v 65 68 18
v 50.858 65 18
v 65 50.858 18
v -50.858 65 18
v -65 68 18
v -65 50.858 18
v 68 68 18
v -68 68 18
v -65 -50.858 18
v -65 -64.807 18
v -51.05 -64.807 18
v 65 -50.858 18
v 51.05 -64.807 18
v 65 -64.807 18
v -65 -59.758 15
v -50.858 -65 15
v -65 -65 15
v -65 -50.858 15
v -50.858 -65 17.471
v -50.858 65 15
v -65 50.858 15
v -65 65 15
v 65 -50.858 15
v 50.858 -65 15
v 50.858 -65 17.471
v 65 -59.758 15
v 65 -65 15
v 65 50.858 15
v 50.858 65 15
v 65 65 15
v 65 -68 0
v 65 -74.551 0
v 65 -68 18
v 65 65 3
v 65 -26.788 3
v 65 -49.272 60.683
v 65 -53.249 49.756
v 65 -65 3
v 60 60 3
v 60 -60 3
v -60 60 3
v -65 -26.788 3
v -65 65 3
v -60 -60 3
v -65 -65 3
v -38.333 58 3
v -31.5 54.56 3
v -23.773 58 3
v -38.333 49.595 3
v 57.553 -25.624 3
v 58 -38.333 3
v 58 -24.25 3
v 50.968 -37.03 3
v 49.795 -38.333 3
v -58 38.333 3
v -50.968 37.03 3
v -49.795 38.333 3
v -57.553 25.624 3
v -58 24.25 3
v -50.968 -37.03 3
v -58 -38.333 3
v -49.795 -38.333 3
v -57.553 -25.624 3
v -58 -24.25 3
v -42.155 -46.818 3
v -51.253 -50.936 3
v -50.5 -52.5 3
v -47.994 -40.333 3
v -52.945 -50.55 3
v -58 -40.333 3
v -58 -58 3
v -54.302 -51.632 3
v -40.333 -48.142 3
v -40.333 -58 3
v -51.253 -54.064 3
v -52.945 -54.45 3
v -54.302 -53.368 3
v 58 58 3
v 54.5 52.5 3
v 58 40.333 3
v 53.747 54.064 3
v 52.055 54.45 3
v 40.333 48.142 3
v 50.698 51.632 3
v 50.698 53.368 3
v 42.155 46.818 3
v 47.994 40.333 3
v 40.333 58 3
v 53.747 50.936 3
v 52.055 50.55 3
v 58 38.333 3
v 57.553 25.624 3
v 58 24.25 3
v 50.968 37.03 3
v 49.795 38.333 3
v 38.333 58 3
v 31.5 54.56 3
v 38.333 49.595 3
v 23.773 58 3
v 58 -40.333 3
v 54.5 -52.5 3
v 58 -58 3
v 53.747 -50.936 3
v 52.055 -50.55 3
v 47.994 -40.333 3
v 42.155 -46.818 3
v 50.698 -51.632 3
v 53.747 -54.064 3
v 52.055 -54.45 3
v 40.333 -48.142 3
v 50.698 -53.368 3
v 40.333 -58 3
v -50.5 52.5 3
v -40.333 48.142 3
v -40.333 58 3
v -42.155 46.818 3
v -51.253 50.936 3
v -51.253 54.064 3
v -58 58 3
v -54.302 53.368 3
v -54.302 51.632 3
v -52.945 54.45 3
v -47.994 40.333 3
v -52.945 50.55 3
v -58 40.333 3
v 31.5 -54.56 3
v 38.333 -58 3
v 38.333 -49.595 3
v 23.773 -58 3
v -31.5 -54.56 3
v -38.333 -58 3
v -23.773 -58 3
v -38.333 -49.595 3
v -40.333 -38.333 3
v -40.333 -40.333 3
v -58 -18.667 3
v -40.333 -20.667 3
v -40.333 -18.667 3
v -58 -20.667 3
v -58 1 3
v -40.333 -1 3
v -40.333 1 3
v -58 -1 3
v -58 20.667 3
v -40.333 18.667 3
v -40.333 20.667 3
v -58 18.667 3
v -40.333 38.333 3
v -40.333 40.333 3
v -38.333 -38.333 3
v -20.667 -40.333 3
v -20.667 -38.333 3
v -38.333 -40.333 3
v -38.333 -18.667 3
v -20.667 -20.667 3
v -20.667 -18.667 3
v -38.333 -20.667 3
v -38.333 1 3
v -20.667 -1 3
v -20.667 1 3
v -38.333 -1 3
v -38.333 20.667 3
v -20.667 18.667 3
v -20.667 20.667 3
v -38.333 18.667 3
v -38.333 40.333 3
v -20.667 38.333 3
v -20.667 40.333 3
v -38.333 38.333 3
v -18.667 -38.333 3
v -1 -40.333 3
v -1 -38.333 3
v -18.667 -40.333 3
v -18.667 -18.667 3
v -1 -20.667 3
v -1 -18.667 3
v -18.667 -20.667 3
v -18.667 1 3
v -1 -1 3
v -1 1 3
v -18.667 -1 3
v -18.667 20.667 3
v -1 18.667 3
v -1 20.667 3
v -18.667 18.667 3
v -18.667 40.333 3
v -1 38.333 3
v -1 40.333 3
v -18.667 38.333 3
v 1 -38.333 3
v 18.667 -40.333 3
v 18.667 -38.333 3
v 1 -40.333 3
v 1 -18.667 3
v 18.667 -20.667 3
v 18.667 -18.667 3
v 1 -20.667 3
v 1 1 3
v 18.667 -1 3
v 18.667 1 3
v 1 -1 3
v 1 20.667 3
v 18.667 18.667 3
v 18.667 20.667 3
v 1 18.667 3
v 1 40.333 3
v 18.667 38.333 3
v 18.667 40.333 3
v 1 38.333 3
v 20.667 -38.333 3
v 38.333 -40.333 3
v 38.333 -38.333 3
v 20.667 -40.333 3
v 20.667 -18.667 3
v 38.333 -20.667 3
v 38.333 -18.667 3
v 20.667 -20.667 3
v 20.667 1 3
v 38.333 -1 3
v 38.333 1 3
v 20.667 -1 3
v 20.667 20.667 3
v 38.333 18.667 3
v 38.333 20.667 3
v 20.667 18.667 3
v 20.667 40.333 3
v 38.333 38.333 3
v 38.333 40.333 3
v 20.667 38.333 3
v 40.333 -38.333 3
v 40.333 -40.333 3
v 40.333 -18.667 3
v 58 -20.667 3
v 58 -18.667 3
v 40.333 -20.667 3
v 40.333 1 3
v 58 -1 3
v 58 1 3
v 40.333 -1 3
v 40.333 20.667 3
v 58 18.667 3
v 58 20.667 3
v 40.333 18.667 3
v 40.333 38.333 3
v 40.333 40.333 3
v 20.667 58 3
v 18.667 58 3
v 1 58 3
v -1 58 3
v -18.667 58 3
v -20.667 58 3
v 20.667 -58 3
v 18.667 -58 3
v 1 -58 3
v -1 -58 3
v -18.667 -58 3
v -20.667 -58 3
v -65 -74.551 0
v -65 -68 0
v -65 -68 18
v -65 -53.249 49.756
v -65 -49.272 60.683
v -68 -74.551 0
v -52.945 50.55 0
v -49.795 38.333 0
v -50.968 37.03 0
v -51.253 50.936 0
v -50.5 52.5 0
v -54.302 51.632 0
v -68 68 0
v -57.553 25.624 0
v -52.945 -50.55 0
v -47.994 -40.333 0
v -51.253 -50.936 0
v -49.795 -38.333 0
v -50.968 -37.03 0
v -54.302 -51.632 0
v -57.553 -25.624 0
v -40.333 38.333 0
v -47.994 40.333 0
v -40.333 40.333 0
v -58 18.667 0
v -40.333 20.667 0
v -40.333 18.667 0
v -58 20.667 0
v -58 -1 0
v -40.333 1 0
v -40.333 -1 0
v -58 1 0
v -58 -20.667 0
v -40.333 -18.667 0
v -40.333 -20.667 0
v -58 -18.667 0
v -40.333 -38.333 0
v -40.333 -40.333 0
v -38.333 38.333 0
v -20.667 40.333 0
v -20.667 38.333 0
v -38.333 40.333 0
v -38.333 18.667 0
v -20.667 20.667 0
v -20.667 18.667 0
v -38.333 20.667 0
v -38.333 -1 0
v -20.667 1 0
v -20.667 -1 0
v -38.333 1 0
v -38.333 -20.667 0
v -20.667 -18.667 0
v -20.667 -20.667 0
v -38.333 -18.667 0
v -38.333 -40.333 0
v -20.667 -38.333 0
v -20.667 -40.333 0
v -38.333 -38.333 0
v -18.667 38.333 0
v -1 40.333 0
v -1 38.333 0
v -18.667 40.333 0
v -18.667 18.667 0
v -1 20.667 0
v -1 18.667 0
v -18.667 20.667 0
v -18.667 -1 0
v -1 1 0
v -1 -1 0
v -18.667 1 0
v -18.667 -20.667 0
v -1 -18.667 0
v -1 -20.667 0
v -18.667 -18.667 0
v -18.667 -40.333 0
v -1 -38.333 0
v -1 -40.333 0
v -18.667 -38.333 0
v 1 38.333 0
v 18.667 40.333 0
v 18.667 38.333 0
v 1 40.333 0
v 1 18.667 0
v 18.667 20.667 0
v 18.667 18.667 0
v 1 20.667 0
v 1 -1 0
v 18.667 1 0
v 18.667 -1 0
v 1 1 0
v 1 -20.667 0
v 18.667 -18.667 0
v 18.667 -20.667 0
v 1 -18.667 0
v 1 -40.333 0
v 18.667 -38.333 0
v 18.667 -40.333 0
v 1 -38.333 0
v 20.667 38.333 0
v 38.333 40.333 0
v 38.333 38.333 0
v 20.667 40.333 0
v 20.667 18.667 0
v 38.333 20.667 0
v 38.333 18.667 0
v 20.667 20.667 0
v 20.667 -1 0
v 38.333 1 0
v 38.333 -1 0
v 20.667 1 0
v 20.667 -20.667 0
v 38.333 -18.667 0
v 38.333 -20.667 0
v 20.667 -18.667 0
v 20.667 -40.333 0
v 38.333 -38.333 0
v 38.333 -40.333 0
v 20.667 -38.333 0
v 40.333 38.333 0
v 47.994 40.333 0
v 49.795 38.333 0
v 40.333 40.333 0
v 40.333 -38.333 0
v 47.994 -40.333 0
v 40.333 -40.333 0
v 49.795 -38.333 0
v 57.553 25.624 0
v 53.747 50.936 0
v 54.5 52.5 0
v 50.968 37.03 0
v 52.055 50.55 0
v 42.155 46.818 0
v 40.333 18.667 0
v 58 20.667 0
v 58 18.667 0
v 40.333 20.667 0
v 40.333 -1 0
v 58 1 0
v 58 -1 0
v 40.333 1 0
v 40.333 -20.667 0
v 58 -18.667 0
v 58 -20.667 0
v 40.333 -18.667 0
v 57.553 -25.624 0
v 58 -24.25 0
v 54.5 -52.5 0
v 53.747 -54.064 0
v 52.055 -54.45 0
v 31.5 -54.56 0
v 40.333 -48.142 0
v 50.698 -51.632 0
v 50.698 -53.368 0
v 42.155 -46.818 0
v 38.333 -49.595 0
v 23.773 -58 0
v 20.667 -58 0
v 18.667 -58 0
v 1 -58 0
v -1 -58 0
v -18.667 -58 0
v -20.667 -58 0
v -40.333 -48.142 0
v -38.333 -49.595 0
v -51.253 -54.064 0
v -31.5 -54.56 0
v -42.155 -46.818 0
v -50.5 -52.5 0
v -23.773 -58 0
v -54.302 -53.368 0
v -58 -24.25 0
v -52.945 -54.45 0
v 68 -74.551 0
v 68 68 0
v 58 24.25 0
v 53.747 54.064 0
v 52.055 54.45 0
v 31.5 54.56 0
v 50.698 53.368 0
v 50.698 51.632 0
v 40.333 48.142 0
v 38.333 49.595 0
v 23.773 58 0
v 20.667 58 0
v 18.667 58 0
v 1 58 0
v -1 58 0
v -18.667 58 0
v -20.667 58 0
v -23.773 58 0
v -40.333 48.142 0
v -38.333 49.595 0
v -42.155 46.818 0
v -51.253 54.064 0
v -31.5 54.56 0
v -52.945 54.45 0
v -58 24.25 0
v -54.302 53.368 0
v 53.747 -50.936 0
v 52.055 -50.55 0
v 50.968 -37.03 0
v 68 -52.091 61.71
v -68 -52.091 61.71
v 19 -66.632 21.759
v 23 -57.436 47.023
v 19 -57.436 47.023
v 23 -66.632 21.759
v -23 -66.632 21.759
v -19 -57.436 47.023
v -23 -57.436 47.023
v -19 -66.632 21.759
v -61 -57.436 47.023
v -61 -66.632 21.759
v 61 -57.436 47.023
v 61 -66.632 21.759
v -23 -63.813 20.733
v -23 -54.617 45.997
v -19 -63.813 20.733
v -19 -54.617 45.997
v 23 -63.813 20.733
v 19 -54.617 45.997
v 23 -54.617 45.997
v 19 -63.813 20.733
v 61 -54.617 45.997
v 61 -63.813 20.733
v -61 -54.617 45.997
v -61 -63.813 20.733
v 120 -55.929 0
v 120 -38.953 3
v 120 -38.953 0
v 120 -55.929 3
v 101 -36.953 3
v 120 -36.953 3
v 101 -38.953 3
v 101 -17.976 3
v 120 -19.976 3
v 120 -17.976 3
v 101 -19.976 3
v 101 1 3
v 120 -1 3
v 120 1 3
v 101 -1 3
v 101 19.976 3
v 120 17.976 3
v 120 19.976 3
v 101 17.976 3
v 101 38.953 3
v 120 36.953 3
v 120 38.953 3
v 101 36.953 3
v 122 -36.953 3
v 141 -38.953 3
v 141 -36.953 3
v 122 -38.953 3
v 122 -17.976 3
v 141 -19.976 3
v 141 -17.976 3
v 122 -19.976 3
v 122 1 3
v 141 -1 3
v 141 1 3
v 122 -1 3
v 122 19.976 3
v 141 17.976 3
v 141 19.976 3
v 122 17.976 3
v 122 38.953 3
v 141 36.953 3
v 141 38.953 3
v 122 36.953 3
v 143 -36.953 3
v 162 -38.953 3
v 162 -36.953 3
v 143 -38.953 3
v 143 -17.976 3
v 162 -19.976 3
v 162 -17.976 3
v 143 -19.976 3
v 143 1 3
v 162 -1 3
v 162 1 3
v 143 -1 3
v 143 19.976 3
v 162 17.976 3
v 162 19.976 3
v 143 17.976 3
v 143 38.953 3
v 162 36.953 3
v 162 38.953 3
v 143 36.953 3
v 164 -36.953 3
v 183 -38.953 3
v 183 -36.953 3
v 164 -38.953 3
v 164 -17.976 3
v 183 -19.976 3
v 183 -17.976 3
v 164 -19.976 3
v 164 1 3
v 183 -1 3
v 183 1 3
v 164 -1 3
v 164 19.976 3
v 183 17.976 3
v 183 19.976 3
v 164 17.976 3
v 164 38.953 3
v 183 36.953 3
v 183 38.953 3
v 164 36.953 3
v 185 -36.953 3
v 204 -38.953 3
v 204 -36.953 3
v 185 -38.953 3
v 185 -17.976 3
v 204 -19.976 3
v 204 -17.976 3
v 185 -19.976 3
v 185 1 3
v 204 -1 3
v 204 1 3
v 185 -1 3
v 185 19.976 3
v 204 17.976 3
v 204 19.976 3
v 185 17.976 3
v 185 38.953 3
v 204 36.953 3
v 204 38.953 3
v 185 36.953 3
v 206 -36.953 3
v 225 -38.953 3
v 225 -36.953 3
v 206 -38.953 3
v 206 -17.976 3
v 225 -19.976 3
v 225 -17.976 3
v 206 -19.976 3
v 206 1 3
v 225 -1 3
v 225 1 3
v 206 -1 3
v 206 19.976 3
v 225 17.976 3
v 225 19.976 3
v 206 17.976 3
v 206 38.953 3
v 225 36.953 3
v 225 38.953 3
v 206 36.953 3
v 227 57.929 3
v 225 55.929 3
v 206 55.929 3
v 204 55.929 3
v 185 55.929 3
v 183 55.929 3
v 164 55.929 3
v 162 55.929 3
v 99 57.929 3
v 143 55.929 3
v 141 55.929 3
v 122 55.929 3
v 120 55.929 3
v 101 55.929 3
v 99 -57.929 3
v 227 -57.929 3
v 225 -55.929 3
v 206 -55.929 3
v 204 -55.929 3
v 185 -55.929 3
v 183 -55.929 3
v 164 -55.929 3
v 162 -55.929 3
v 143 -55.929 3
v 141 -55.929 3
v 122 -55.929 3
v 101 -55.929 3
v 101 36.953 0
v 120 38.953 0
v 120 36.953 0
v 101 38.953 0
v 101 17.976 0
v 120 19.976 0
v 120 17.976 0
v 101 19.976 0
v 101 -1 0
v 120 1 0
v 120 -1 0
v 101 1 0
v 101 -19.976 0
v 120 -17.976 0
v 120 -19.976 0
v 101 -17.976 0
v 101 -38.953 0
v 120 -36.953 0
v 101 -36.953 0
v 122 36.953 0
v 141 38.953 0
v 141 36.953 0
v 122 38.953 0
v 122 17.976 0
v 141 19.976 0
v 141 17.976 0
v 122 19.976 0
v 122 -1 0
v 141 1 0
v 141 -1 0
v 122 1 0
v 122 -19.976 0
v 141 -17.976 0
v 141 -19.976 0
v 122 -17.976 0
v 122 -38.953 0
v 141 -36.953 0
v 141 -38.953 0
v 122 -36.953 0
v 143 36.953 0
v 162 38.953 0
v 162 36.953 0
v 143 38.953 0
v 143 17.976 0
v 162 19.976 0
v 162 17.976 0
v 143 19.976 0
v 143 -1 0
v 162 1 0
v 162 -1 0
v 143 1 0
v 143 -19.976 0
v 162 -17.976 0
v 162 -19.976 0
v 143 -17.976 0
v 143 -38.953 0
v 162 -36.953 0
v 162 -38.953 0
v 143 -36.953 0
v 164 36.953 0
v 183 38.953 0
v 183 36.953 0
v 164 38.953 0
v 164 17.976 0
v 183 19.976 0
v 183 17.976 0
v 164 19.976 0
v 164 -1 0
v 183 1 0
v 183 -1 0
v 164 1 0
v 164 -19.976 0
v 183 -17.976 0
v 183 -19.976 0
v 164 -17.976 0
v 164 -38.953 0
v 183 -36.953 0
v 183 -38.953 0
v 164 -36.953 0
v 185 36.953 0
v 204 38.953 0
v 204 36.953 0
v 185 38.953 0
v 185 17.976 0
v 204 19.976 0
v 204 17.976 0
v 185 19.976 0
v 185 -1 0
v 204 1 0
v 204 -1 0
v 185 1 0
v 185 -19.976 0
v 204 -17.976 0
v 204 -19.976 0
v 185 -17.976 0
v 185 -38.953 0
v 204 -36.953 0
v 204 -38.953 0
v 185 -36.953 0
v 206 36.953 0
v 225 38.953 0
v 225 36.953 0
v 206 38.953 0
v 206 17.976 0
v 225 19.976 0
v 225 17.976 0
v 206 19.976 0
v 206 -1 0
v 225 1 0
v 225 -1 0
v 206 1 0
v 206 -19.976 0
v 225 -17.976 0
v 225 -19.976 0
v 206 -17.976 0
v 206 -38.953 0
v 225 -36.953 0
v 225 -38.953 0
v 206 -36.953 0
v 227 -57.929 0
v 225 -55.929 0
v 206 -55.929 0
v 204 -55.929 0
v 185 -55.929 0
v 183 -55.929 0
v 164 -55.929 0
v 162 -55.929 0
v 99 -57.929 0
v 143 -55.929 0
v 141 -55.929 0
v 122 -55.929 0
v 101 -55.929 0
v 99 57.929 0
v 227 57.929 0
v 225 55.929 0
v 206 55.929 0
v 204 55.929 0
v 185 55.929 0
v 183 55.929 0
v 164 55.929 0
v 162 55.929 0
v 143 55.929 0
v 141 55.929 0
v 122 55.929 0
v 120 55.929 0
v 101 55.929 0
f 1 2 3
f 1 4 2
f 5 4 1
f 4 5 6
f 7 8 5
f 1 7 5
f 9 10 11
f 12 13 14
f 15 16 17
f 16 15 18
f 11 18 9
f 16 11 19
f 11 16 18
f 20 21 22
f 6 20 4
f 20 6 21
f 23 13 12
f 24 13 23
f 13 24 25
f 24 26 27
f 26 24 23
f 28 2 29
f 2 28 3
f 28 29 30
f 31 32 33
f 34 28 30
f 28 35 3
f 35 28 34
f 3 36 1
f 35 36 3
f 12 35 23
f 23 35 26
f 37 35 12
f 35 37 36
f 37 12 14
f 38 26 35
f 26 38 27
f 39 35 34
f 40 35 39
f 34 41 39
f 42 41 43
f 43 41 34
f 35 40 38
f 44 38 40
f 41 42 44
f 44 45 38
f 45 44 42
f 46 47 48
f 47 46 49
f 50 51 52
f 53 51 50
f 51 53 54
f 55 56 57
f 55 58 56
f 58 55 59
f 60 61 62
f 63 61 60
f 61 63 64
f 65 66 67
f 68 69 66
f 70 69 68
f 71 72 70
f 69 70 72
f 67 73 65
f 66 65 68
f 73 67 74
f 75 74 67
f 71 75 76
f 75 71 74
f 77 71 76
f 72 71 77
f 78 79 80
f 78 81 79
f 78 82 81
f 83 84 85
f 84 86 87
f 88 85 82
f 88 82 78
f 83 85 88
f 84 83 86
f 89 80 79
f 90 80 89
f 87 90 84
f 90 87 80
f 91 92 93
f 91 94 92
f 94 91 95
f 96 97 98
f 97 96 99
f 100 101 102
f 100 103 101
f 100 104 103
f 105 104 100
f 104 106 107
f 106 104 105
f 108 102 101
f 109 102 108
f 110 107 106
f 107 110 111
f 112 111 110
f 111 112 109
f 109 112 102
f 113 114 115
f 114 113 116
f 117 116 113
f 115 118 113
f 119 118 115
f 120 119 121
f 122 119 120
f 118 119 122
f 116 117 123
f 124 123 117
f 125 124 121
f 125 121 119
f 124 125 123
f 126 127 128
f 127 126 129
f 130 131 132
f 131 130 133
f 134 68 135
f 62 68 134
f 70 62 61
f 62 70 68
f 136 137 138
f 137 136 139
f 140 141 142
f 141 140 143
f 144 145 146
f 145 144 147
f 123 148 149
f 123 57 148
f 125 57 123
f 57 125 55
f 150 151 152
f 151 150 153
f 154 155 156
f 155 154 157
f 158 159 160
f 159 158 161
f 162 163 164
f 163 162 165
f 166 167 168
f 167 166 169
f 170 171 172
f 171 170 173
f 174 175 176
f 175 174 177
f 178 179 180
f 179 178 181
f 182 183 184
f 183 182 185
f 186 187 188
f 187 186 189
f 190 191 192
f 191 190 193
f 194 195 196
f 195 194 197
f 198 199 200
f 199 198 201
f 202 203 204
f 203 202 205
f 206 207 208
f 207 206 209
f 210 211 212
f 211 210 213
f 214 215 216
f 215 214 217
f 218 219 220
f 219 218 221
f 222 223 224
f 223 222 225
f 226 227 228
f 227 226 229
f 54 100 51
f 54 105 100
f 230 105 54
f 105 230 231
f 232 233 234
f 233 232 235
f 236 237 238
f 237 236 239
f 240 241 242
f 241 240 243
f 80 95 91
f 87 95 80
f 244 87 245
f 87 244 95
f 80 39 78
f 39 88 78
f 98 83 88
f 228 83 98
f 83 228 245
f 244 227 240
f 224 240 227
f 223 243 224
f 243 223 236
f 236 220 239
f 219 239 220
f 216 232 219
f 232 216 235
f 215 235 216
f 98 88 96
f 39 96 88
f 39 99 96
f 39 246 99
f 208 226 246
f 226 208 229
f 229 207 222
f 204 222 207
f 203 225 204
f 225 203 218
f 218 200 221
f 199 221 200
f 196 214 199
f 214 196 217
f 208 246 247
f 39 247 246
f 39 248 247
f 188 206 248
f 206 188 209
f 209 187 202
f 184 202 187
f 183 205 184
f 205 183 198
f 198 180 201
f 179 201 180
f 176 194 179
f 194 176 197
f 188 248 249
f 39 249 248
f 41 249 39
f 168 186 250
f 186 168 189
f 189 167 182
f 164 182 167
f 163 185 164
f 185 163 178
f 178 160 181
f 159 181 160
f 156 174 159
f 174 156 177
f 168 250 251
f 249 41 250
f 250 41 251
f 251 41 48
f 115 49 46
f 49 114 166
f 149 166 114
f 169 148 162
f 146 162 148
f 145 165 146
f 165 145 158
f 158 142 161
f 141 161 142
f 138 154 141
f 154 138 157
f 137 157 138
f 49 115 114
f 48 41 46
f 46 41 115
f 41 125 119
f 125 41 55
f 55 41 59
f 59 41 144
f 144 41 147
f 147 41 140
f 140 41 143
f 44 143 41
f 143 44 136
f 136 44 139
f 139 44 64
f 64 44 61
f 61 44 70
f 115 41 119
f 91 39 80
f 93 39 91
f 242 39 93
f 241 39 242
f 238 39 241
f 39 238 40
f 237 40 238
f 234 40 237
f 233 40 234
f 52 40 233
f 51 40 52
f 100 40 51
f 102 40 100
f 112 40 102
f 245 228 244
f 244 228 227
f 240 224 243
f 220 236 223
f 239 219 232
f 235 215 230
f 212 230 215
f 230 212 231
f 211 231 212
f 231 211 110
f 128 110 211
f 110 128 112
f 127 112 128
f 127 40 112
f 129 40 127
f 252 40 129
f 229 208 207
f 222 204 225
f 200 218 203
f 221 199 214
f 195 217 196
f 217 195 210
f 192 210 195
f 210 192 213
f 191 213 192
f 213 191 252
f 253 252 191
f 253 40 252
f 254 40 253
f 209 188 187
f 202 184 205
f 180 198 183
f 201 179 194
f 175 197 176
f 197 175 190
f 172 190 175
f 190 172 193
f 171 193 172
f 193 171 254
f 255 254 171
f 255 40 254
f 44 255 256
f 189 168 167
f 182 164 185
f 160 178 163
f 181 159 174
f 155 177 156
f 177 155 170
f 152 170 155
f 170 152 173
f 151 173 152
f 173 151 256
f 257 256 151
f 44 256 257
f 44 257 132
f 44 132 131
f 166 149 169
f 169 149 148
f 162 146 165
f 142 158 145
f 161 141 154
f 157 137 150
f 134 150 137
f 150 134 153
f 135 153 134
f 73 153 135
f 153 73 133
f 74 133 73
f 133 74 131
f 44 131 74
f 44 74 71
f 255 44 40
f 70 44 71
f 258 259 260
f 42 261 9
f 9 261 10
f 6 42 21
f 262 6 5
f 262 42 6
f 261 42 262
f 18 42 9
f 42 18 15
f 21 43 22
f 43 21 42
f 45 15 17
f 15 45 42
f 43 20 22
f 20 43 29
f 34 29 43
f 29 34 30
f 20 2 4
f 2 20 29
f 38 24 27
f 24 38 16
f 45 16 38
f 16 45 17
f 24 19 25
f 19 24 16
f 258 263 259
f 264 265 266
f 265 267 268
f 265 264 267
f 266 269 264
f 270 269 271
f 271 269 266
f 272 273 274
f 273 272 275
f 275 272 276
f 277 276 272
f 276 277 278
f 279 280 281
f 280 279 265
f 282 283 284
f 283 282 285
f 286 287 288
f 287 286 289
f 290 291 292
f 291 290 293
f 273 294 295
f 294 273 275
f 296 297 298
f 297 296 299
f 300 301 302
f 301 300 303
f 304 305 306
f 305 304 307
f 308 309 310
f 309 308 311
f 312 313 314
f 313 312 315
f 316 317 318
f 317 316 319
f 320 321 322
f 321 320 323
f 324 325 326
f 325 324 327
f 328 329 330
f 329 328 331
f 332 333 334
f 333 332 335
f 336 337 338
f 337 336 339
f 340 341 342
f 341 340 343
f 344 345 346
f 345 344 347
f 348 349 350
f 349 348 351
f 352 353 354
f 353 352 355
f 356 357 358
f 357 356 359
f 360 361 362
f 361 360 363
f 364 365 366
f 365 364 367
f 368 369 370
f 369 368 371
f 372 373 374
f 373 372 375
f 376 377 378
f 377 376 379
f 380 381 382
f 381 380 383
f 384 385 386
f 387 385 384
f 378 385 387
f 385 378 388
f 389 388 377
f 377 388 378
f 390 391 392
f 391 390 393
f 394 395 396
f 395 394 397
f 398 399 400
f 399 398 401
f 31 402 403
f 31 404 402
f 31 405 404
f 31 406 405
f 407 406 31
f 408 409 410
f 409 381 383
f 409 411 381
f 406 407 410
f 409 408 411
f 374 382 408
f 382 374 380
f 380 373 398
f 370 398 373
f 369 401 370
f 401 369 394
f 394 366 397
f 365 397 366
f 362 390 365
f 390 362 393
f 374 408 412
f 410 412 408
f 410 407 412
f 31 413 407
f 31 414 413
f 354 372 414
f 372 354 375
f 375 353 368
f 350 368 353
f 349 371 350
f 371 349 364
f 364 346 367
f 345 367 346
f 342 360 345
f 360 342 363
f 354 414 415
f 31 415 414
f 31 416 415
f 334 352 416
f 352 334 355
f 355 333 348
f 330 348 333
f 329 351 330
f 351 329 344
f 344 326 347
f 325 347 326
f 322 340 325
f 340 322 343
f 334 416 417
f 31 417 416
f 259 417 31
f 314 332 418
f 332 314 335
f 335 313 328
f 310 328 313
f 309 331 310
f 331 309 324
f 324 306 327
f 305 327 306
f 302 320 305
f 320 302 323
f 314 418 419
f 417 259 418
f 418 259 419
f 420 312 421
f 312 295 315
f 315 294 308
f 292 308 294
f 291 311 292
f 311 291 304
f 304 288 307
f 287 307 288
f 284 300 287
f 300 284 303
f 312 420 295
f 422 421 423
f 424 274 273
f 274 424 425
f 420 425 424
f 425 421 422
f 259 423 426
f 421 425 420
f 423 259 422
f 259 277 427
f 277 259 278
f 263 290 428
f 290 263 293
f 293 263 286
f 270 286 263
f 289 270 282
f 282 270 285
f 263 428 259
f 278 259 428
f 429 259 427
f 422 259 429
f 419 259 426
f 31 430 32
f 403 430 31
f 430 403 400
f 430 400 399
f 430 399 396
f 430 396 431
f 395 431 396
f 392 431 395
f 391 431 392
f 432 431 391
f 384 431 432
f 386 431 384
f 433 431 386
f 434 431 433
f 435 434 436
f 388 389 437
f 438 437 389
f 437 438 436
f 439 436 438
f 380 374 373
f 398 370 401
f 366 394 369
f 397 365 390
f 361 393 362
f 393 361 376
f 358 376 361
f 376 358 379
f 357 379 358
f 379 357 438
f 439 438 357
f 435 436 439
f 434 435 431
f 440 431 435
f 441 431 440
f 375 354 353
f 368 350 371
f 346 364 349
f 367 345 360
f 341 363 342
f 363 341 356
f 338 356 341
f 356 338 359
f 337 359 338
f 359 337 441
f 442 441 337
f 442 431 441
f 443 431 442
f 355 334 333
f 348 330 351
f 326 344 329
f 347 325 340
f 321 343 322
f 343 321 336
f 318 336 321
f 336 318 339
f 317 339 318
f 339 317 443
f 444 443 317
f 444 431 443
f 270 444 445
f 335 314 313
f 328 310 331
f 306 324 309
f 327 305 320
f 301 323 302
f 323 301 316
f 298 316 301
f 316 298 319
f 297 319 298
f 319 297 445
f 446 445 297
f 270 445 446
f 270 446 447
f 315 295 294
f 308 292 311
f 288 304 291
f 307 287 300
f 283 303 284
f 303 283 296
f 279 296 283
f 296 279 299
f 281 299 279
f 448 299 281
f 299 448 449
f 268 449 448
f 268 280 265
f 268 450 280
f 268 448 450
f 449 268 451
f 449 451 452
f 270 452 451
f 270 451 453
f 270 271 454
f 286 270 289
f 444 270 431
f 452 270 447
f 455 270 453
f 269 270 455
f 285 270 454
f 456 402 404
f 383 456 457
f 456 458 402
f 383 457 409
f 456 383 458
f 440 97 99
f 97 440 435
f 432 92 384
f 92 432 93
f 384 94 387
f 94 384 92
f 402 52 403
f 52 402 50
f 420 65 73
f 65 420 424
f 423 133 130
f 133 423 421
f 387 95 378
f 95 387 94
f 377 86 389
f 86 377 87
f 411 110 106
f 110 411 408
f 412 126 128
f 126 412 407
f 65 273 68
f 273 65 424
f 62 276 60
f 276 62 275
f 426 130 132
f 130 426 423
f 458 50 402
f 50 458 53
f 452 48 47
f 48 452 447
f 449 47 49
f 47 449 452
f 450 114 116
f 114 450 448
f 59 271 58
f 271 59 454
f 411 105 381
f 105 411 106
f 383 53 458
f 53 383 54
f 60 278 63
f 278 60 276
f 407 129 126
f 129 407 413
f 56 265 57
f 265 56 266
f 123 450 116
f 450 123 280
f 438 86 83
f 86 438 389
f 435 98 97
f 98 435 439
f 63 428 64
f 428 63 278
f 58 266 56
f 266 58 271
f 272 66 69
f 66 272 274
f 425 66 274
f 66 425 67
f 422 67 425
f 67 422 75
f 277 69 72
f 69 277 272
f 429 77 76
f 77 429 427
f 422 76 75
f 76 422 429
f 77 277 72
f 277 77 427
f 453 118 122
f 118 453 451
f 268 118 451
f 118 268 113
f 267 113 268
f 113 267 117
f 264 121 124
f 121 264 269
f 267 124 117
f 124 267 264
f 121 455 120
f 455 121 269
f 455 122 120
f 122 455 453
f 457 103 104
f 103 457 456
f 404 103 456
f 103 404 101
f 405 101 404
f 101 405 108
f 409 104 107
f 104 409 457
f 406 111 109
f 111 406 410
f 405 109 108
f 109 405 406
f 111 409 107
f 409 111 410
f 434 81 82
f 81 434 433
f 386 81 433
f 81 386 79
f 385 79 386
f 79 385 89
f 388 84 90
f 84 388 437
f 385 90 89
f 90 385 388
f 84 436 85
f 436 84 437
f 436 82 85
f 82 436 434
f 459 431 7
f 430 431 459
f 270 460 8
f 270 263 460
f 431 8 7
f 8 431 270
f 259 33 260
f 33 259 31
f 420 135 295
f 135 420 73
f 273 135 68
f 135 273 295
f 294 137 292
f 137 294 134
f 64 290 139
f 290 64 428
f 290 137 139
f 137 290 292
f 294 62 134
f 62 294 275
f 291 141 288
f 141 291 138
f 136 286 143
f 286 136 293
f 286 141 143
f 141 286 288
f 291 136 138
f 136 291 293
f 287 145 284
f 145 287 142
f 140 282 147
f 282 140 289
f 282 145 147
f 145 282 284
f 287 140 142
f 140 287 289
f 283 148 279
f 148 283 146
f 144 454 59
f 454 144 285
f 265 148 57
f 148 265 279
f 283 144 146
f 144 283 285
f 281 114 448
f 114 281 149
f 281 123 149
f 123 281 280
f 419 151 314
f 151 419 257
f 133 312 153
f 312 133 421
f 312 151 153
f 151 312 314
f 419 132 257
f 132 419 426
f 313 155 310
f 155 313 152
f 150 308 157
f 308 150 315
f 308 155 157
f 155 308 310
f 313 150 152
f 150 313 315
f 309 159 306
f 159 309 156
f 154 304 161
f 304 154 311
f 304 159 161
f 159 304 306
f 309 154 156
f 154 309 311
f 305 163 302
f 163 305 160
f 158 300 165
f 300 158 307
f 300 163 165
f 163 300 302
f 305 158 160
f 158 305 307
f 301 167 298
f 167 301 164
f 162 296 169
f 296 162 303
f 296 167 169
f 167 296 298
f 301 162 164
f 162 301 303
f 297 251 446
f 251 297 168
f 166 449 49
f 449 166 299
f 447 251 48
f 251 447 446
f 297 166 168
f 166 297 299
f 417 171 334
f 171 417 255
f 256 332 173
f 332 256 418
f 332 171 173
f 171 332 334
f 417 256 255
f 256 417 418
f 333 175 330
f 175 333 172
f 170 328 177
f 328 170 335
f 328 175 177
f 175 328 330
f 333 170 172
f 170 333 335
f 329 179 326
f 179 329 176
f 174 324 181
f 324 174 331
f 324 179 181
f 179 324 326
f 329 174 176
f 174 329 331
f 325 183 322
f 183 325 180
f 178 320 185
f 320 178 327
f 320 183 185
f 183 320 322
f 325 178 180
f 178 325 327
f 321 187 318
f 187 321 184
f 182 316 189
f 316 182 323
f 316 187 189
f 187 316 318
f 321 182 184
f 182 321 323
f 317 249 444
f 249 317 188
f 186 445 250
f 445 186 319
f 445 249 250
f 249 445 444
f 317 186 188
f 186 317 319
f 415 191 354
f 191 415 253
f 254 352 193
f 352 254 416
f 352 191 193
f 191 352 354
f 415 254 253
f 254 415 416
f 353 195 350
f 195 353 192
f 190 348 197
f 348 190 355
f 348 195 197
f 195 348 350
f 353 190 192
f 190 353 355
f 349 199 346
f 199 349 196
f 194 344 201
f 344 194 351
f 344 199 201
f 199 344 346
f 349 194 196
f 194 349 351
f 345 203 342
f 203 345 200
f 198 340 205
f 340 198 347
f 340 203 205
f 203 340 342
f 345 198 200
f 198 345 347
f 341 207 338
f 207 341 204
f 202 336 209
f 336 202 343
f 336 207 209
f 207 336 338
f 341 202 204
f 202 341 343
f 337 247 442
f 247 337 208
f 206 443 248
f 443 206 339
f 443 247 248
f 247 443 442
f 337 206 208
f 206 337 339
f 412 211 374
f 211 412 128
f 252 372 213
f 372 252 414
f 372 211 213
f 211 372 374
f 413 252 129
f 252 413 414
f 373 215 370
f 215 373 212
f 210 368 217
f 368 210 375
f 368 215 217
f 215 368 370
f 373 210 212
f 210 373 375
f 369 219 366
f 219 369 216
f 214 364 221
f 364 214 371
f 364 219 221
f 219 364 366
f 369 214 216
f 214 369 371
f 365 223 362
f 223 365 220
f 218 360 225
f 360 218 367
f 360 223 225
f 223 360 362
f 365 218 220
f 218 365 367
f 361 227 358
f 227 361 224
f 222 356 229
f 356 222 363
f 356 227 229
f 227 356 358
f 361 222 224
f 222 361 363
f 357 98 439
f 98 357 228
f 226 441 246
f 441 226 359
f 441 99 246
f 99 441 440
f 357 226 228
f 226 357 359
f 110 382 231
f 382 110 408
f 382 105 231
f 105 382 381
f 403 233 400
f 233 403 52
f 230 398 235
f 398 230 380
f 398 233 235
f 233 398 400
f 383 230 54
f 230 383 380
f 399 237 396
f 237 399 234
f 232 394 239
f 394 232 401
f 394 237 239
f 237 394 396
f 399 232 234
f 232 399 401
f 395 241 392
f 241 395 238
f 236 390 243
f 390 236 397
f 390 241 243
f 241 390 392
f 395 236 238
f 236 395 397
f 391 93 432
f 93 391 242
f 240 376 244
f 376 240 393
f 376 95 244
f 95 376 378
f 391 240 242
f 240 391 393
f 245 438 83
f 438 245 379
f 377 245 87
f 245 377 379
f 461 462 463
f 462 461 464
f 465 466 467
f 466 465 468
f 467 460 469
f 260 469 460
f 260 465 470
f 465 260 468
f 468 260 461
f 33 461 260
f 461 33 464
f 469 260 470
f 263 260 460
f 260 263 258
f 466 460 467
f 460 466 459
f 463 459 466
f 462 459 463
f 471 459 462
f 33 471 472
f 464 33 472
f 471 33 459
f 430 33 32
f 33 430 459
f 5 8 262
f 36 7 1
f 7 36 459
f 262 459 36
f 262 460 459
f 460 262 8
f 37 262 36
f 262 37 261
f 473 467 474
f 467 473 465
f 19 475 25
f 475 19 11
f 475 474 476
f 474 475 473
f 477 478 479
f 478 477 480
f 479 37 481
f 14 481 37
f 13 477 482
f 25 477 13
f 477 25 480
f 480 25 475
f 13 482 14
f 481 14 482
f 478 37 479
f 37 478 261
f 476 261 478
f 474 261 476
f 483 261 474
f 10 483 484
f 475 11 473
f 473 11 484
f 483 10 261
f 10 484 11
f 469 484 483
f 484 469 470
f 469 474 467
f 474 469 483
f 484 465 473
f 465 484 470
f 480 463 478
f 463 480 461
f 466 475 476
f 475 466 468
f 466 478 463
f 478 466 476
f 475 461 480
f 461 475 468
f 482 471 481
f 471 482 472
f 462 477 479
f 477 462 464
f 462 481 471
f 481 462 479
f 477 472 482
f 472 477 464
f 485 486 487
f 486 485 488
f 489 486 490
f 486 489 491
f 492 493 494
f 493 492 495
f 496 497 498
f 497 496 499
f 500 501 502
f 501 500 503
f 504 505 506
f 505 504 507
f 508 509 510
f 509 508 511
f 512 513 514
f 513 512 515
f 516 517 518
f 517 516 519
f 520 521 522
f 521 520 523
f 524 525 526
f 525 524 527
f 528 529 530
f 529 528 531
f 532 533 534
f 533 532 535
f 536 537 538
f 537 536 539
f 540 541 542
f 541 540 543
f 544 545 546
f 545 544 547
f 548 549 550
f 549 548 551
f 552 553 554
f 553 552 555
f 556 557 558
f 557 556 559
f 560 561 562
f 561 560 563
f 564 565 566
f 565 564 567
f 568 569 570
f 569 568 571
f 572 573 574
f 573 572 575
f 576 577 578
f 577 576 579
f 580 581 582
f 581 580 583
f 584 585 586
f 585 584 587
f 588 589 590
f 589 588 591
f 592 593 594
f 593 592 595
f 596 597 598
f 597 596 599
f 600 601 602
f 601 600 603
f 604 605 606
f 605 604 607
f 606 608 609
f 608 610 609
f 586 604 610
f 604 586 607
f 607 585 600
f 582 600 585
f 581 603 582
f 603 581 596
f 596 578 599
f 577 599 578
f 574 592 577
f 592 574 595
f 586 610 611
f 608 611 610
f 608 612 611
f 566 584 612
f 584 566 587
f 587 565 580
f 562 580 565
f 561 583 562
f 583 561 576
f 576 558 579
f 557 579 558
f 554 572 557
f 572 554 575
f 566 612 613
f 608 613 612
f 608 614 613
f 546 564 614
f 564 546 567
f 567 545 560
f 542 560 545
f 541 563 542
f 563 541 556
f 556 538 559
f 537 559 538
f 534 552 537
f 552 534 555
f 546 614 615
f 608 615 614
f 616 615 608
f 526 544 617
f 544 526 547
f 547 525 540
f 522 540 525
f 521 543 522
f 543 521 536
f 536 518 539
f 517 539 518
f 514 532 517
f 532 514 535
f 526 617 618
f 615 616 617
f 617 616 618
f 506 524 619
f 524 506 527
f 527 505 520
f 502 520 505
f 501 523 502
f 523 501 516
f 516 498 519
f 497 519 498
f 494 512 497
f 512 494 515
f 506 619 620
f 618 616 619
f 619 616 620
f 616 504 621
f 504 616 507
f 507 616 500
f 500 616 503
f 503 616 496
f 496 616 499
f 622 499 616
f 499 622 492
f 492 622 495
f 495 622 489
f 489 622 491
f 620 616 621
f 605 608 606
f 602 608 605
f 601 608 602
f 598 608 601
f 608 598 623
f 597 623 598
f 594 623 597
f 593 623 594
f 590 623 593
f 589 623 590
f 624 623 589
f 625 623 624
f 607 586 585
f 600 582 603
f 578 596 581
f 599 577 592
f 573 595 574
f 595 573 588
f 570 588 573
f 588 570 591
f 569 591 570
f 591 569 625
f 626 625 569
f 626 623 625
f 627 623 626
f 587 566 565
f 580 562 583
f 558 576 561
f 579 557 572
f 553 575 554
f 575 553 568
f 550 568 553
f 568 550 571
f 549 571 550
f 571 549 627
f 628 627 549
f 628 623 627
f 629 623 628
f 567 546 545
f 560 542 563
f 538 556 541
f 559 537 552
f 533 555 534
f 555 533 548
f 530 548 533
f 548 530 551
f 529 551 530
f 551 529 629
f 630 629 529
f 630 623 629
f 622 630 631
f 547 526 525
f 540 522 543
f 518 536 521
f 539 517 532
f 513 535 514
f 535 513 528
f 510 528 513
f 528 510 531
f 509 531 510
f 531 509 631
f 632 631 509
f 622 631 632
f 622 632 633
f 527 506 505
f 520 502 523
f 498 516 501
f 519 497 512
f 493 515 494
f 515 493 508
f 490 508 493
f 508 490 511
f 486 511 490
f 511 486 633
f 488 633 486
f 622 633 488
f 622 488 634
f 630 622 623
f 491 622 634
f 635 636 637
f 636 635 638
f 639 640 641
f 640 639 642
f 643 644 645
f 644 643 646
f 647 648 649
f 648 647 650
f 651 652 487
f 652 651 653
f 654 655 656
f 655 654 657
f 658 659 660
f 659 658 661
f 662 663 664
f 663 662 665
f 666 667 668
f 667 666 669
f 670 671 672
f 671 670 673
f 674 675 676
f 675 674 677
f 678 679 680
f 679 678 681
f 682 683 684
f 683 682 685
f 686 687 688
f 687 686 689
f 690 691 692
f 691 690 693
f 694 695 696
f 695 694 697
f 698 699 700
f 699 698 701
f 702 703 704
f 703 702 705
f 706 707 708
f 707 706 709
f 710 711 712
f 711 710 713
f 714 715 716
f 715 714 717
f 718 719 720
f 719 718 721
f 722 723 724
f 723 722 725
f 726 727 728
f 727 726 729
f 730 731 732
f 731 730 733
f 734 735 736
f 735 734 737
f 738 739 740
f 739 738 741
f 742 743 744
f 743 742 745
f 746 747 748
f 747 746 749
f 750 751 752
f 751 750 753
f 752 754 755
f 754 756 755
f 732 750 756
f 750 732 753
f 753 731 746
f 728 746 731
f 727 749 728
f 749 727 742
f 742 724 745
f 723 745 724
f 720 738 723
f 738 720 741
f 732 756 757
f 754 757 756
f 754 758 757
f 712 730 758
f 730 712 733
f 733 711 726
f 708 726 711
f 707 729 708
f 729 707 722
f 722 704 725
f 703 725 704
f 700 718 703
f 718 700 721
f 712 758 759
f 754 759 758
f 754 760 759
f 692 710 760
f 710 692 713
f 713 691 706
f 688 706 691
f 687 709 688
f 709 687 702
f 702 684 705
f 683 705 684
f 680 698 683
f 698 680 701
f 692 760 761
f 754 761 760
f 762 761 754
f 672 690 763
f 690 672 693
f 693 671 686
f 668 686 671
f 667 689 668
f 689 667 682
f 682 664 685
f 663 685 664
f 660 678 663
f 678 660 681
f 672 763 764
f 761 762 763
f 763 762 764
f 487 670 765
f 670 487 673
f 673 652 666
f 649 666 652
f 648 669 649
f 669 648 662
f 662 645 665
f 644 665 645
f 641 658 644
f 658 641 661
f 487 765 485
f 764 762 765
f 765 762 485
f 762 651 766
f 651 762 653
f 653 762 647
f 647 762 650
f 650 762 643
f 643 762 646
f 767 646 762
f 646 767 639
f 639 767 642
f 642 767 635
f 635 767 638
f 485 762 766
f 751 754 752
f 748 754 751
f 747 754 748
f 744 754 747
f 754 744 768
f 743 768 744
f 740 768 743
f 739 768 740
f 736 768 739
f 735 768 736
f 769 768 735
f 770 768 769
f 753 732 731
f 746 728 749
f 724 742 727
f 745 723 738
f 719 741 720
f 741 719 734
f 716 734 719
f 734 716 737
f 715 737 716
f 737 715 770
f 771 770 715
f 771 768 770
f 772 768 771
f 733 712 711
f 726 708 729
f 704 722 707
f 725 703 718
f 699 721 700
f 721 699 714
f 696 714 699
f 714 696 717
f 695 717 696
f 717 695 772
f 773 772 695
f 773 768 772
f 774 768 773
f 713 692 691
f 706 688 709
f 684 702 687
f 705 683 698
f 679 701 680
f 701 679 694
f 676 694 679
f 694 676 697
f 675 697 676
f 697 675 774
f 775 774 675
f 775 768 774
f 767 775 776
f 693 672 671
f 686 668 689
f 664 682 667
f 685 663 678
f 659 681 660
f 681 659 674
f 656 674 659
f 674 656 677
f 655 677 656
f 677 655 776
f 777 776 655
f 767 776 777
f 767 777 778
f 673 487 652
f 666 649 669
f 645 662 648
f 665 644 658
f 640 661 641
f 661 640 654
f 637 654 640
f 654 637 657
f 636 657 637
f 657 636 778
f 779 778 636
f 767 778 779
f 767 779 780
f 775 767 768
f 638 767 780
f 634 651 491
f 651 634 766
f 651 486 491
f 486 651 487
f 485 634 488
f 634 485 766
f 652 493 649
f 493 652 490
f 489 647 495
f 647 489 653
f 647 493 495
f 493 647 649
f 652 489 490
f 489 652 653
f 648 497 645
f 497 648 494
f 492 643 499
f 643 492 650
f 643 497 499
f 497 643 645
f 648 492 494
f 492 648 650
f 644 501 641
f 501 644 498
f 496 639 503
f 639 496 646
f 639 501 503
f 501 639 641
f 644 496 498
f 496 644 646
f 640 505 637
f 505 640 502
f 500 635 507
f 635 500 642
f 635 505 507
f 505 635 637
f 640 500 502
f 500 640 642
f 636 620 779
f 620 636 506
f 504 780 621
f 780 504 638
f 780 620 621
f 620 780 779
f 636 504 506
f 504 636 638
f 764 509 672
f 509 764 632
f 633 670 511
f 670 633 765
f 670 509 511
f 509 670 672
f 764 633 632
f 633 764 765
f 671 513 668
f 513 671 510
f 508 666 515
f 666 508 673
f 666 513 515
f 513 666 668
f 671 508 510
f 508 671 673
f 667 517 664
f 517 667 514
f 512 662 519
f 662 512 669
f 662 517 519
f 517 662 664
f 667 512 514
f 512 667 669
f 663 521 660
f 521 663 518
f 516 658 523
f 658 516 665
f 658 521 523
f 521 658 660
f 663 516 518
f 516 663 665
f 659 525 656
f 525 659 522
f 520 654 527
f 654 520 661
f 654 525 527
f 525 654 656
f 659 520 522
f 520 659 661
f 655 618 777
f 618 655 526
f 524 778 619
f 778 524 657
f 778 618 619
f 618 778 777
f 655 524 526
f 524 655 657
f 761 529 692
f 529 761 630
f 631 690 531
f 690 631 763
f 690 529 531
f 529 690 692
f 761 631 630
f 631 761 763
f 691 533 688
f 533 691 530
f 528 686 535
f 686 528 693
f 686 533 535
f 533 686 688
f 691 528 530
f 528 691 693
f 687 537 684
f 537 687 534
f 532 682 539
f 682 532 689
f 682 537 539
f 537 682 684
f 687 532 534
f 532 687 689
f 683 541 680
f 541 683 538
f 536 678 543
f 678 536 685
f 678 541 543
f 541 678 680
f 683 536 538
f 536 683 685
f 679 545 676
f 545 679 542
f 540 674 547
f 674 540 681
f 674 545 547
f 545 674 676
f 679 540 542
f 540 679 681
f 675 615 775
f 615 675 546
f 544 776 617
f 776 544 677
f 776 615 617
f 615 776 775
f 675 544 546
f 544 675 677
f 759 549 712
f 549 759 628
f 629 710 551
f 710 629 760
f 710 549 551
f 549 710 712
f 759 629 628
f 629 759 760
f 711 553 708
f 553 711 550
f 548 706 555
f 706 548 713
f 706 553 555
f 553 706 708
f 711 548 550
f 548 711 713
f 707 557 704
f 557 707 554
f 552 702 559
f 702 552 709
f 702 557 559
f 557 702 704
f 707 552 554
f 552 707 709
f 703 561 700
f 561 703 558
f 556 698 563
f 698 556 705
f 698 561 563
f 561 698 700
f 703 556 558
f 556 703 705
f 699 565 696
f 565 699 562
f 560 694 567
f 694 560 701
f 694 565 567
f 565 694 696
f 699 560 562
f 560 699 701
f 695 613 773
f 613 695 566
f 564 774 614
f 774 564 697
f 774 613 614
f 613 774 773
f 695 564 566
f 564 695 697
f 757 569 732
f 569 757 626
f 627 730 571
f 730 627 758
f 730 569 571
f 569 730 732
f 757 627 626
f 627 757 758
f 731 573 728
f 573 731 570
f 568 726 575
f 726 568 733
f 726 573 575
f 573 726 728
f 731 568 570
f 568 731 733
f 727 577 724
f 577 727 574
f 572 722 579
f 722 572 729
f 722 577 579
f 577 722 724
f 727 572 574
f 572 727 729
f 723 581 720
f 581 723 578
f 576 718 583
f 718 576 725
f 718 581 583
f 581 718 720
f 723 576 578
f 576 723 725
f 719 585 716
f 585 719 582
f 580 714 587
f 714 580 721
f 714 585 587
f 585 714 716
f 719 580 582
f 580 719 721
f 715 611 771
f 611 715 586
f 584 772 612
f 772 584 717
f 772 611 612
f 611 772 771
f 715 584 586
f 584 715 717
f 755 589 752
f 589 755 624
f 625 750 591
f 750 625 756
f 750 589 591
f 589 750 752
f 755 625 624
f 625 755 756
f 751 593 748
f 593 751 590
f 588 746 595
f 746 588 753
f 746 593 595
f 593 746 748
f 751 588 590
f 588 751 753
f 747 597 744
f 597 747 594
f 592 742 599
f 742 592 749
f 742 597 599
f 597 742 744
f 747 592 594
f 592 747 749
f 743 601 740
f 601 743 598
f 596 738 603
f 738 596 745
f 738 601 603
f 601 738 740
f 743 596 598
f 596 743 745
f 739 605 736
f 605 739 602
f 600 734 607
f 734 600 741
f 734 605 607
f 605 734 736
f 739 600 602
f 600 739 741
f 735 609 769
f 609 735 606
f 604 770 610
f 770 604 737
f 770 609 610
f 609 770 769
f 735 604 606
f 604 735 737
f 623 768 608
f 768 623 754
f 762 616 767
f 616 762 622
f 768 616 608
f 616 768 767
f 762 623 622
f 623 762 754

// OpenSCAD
// Solder Fume Extractor - by Nirav Patel <http://eclecti.cc>
//
// This is a parametric solder fume extractor, designed to be used either
// vertically to pull in a larger volume of air or horizontally to have
// stronger suction.  It is a blatant rip off of a Hakko FA-400.
// In the default configuration, it works with a 120mm fan and the filters
// used by the Hakko and similar commercial fume extractors.
//
// This work is licensed under a Creative Commons Attribution 3.0 Unported License.

filter_w = 130;
filter_t = 9;
wall = 3;
fan_w = 120;
fan_r = 63;
fan_hole = 105/2;
fan_hole_r = 2;
angle = 20;
corner = 10;

// grating used to hold both sides of the filter
module grating(w, h, t, holes_x, holes_y, grate_wall) {
    translate([-w/2, -h/2, 0]) {
        difference() {
            cube([w, h, t]);
            for(x = [grate_wall : (w-grate_wall)/holes_x : w-grate_wall]) {
                for(y = [grate_wall : (h-grate_wall)/holes_y : h-grate_wall]) {
                    translate([x, y, 0])
                        cube([(w-grate_wall)/holes_x-grate_wall, (h-grate_wall)/holes_y-grate_wall, t]);
                }
            }
        }
    }
}

union() {
    difference() {
        // main body of filter holder
        translate([-filter_w/2-wall, -filter_w/2-wall, 0])
            cube([filter_w+wall*2, filter_w+wall*2, filter_t+wall*3]);
        difference() {
            // filter area
            translate([-filter_w/2, -filter_w/2, wall])
                cube([filter_w, filter_w, filter_t+wall*2]);
            // cut the corners that'll hold the filter grate in place
            for (x = [-1, 1])
                for (y = [-1, 1])
                    translate([filter_w/2*x, filter_w/2*y, filter_t+wall*2])
                        rotate([0, 0, 45])
                            translate([-corner, -corner, 0])
                                cube([corner*2, corner*2, wall]);
        }
        // fan air hole   
        intersection() {
            translate([-fan_w/2, -fan_w/2, 0])
                cube([fan_w, fan_w, wall]);
            cylinder(h = wall, r = fan_r);
        }
        // fan bolt holes
        for (x = [-1, 1])
            for (y = [-1, 1])
                translate([x*fan_hole, y*fan_hole, 0])
                    cylinder(h = wall, r = fan_hole_r);
    }
    // grating on the fan side of the filter
    grating(fan_w, fan_w, wall, 6, 6, 2);
    // the angled housing
    intersection() {
        translate([-filter_w/2-wall, -filter_w/2-wall, filter_t+wall*3]) {
            rotate([-angle, 0, 0]) {
                union() {
                    difference() {
                        union() {
                            cube([filter_w+wall*2, (filter_w+wall*2)*cos(angle), (filter_w+wall*2)*sin(angle)]);
                            // extra little angled feet
                            for (x = [0, filter_w+wall])
                                translate([x, 0, -(filter_t+wall*3)/cos(angle)])
                                    cube([wall, (filter_w+wall*2)*cos(angle), (filter_t+wall*3)/cos(angle)]);
                        }
                        // hollow the inside
                        translate([wall, wall, 0])
                           cube([filter_w, filter_w, (filter_w+wall*2)*sin(angle)]);
                        // make an opening for the grating
                        rotate([90, 0, 0])
                            translate([wall, 0, -2*wall])
                                cube([filter_w, (filter_w+wall*2)*sin(angle)*0.75, 3*wall]);
                    }
                    // the air intake for horizontal orientation
                    rotate([90, 0, 0])
                        translate([filter_w/2+wall, (filter_w+wall*2)*sin(angle)*0.75/2, -wall])
                            grating(filter_w, (filter_w+wall*2)*sin(angle)*0.75, wall, 3, 1, 4);
                }
            }
        }
        // cut off the bits that are outside our working area
        translate([-filter_w/2-wall, -filter_w/2-wall-50, 0])
            cube([filter_w+wall*2, filter_w+wall*2+50, filter_t+wall*3+(filter_w+wall*2)*tan(angle)]);
    }
}

// the filter grate on the intake side
translate([filter_w+wall+30, 0, 0])
    grating(filter_w-2, filter_w-corner*sqrt(2), wall, 6, 6, 2);
